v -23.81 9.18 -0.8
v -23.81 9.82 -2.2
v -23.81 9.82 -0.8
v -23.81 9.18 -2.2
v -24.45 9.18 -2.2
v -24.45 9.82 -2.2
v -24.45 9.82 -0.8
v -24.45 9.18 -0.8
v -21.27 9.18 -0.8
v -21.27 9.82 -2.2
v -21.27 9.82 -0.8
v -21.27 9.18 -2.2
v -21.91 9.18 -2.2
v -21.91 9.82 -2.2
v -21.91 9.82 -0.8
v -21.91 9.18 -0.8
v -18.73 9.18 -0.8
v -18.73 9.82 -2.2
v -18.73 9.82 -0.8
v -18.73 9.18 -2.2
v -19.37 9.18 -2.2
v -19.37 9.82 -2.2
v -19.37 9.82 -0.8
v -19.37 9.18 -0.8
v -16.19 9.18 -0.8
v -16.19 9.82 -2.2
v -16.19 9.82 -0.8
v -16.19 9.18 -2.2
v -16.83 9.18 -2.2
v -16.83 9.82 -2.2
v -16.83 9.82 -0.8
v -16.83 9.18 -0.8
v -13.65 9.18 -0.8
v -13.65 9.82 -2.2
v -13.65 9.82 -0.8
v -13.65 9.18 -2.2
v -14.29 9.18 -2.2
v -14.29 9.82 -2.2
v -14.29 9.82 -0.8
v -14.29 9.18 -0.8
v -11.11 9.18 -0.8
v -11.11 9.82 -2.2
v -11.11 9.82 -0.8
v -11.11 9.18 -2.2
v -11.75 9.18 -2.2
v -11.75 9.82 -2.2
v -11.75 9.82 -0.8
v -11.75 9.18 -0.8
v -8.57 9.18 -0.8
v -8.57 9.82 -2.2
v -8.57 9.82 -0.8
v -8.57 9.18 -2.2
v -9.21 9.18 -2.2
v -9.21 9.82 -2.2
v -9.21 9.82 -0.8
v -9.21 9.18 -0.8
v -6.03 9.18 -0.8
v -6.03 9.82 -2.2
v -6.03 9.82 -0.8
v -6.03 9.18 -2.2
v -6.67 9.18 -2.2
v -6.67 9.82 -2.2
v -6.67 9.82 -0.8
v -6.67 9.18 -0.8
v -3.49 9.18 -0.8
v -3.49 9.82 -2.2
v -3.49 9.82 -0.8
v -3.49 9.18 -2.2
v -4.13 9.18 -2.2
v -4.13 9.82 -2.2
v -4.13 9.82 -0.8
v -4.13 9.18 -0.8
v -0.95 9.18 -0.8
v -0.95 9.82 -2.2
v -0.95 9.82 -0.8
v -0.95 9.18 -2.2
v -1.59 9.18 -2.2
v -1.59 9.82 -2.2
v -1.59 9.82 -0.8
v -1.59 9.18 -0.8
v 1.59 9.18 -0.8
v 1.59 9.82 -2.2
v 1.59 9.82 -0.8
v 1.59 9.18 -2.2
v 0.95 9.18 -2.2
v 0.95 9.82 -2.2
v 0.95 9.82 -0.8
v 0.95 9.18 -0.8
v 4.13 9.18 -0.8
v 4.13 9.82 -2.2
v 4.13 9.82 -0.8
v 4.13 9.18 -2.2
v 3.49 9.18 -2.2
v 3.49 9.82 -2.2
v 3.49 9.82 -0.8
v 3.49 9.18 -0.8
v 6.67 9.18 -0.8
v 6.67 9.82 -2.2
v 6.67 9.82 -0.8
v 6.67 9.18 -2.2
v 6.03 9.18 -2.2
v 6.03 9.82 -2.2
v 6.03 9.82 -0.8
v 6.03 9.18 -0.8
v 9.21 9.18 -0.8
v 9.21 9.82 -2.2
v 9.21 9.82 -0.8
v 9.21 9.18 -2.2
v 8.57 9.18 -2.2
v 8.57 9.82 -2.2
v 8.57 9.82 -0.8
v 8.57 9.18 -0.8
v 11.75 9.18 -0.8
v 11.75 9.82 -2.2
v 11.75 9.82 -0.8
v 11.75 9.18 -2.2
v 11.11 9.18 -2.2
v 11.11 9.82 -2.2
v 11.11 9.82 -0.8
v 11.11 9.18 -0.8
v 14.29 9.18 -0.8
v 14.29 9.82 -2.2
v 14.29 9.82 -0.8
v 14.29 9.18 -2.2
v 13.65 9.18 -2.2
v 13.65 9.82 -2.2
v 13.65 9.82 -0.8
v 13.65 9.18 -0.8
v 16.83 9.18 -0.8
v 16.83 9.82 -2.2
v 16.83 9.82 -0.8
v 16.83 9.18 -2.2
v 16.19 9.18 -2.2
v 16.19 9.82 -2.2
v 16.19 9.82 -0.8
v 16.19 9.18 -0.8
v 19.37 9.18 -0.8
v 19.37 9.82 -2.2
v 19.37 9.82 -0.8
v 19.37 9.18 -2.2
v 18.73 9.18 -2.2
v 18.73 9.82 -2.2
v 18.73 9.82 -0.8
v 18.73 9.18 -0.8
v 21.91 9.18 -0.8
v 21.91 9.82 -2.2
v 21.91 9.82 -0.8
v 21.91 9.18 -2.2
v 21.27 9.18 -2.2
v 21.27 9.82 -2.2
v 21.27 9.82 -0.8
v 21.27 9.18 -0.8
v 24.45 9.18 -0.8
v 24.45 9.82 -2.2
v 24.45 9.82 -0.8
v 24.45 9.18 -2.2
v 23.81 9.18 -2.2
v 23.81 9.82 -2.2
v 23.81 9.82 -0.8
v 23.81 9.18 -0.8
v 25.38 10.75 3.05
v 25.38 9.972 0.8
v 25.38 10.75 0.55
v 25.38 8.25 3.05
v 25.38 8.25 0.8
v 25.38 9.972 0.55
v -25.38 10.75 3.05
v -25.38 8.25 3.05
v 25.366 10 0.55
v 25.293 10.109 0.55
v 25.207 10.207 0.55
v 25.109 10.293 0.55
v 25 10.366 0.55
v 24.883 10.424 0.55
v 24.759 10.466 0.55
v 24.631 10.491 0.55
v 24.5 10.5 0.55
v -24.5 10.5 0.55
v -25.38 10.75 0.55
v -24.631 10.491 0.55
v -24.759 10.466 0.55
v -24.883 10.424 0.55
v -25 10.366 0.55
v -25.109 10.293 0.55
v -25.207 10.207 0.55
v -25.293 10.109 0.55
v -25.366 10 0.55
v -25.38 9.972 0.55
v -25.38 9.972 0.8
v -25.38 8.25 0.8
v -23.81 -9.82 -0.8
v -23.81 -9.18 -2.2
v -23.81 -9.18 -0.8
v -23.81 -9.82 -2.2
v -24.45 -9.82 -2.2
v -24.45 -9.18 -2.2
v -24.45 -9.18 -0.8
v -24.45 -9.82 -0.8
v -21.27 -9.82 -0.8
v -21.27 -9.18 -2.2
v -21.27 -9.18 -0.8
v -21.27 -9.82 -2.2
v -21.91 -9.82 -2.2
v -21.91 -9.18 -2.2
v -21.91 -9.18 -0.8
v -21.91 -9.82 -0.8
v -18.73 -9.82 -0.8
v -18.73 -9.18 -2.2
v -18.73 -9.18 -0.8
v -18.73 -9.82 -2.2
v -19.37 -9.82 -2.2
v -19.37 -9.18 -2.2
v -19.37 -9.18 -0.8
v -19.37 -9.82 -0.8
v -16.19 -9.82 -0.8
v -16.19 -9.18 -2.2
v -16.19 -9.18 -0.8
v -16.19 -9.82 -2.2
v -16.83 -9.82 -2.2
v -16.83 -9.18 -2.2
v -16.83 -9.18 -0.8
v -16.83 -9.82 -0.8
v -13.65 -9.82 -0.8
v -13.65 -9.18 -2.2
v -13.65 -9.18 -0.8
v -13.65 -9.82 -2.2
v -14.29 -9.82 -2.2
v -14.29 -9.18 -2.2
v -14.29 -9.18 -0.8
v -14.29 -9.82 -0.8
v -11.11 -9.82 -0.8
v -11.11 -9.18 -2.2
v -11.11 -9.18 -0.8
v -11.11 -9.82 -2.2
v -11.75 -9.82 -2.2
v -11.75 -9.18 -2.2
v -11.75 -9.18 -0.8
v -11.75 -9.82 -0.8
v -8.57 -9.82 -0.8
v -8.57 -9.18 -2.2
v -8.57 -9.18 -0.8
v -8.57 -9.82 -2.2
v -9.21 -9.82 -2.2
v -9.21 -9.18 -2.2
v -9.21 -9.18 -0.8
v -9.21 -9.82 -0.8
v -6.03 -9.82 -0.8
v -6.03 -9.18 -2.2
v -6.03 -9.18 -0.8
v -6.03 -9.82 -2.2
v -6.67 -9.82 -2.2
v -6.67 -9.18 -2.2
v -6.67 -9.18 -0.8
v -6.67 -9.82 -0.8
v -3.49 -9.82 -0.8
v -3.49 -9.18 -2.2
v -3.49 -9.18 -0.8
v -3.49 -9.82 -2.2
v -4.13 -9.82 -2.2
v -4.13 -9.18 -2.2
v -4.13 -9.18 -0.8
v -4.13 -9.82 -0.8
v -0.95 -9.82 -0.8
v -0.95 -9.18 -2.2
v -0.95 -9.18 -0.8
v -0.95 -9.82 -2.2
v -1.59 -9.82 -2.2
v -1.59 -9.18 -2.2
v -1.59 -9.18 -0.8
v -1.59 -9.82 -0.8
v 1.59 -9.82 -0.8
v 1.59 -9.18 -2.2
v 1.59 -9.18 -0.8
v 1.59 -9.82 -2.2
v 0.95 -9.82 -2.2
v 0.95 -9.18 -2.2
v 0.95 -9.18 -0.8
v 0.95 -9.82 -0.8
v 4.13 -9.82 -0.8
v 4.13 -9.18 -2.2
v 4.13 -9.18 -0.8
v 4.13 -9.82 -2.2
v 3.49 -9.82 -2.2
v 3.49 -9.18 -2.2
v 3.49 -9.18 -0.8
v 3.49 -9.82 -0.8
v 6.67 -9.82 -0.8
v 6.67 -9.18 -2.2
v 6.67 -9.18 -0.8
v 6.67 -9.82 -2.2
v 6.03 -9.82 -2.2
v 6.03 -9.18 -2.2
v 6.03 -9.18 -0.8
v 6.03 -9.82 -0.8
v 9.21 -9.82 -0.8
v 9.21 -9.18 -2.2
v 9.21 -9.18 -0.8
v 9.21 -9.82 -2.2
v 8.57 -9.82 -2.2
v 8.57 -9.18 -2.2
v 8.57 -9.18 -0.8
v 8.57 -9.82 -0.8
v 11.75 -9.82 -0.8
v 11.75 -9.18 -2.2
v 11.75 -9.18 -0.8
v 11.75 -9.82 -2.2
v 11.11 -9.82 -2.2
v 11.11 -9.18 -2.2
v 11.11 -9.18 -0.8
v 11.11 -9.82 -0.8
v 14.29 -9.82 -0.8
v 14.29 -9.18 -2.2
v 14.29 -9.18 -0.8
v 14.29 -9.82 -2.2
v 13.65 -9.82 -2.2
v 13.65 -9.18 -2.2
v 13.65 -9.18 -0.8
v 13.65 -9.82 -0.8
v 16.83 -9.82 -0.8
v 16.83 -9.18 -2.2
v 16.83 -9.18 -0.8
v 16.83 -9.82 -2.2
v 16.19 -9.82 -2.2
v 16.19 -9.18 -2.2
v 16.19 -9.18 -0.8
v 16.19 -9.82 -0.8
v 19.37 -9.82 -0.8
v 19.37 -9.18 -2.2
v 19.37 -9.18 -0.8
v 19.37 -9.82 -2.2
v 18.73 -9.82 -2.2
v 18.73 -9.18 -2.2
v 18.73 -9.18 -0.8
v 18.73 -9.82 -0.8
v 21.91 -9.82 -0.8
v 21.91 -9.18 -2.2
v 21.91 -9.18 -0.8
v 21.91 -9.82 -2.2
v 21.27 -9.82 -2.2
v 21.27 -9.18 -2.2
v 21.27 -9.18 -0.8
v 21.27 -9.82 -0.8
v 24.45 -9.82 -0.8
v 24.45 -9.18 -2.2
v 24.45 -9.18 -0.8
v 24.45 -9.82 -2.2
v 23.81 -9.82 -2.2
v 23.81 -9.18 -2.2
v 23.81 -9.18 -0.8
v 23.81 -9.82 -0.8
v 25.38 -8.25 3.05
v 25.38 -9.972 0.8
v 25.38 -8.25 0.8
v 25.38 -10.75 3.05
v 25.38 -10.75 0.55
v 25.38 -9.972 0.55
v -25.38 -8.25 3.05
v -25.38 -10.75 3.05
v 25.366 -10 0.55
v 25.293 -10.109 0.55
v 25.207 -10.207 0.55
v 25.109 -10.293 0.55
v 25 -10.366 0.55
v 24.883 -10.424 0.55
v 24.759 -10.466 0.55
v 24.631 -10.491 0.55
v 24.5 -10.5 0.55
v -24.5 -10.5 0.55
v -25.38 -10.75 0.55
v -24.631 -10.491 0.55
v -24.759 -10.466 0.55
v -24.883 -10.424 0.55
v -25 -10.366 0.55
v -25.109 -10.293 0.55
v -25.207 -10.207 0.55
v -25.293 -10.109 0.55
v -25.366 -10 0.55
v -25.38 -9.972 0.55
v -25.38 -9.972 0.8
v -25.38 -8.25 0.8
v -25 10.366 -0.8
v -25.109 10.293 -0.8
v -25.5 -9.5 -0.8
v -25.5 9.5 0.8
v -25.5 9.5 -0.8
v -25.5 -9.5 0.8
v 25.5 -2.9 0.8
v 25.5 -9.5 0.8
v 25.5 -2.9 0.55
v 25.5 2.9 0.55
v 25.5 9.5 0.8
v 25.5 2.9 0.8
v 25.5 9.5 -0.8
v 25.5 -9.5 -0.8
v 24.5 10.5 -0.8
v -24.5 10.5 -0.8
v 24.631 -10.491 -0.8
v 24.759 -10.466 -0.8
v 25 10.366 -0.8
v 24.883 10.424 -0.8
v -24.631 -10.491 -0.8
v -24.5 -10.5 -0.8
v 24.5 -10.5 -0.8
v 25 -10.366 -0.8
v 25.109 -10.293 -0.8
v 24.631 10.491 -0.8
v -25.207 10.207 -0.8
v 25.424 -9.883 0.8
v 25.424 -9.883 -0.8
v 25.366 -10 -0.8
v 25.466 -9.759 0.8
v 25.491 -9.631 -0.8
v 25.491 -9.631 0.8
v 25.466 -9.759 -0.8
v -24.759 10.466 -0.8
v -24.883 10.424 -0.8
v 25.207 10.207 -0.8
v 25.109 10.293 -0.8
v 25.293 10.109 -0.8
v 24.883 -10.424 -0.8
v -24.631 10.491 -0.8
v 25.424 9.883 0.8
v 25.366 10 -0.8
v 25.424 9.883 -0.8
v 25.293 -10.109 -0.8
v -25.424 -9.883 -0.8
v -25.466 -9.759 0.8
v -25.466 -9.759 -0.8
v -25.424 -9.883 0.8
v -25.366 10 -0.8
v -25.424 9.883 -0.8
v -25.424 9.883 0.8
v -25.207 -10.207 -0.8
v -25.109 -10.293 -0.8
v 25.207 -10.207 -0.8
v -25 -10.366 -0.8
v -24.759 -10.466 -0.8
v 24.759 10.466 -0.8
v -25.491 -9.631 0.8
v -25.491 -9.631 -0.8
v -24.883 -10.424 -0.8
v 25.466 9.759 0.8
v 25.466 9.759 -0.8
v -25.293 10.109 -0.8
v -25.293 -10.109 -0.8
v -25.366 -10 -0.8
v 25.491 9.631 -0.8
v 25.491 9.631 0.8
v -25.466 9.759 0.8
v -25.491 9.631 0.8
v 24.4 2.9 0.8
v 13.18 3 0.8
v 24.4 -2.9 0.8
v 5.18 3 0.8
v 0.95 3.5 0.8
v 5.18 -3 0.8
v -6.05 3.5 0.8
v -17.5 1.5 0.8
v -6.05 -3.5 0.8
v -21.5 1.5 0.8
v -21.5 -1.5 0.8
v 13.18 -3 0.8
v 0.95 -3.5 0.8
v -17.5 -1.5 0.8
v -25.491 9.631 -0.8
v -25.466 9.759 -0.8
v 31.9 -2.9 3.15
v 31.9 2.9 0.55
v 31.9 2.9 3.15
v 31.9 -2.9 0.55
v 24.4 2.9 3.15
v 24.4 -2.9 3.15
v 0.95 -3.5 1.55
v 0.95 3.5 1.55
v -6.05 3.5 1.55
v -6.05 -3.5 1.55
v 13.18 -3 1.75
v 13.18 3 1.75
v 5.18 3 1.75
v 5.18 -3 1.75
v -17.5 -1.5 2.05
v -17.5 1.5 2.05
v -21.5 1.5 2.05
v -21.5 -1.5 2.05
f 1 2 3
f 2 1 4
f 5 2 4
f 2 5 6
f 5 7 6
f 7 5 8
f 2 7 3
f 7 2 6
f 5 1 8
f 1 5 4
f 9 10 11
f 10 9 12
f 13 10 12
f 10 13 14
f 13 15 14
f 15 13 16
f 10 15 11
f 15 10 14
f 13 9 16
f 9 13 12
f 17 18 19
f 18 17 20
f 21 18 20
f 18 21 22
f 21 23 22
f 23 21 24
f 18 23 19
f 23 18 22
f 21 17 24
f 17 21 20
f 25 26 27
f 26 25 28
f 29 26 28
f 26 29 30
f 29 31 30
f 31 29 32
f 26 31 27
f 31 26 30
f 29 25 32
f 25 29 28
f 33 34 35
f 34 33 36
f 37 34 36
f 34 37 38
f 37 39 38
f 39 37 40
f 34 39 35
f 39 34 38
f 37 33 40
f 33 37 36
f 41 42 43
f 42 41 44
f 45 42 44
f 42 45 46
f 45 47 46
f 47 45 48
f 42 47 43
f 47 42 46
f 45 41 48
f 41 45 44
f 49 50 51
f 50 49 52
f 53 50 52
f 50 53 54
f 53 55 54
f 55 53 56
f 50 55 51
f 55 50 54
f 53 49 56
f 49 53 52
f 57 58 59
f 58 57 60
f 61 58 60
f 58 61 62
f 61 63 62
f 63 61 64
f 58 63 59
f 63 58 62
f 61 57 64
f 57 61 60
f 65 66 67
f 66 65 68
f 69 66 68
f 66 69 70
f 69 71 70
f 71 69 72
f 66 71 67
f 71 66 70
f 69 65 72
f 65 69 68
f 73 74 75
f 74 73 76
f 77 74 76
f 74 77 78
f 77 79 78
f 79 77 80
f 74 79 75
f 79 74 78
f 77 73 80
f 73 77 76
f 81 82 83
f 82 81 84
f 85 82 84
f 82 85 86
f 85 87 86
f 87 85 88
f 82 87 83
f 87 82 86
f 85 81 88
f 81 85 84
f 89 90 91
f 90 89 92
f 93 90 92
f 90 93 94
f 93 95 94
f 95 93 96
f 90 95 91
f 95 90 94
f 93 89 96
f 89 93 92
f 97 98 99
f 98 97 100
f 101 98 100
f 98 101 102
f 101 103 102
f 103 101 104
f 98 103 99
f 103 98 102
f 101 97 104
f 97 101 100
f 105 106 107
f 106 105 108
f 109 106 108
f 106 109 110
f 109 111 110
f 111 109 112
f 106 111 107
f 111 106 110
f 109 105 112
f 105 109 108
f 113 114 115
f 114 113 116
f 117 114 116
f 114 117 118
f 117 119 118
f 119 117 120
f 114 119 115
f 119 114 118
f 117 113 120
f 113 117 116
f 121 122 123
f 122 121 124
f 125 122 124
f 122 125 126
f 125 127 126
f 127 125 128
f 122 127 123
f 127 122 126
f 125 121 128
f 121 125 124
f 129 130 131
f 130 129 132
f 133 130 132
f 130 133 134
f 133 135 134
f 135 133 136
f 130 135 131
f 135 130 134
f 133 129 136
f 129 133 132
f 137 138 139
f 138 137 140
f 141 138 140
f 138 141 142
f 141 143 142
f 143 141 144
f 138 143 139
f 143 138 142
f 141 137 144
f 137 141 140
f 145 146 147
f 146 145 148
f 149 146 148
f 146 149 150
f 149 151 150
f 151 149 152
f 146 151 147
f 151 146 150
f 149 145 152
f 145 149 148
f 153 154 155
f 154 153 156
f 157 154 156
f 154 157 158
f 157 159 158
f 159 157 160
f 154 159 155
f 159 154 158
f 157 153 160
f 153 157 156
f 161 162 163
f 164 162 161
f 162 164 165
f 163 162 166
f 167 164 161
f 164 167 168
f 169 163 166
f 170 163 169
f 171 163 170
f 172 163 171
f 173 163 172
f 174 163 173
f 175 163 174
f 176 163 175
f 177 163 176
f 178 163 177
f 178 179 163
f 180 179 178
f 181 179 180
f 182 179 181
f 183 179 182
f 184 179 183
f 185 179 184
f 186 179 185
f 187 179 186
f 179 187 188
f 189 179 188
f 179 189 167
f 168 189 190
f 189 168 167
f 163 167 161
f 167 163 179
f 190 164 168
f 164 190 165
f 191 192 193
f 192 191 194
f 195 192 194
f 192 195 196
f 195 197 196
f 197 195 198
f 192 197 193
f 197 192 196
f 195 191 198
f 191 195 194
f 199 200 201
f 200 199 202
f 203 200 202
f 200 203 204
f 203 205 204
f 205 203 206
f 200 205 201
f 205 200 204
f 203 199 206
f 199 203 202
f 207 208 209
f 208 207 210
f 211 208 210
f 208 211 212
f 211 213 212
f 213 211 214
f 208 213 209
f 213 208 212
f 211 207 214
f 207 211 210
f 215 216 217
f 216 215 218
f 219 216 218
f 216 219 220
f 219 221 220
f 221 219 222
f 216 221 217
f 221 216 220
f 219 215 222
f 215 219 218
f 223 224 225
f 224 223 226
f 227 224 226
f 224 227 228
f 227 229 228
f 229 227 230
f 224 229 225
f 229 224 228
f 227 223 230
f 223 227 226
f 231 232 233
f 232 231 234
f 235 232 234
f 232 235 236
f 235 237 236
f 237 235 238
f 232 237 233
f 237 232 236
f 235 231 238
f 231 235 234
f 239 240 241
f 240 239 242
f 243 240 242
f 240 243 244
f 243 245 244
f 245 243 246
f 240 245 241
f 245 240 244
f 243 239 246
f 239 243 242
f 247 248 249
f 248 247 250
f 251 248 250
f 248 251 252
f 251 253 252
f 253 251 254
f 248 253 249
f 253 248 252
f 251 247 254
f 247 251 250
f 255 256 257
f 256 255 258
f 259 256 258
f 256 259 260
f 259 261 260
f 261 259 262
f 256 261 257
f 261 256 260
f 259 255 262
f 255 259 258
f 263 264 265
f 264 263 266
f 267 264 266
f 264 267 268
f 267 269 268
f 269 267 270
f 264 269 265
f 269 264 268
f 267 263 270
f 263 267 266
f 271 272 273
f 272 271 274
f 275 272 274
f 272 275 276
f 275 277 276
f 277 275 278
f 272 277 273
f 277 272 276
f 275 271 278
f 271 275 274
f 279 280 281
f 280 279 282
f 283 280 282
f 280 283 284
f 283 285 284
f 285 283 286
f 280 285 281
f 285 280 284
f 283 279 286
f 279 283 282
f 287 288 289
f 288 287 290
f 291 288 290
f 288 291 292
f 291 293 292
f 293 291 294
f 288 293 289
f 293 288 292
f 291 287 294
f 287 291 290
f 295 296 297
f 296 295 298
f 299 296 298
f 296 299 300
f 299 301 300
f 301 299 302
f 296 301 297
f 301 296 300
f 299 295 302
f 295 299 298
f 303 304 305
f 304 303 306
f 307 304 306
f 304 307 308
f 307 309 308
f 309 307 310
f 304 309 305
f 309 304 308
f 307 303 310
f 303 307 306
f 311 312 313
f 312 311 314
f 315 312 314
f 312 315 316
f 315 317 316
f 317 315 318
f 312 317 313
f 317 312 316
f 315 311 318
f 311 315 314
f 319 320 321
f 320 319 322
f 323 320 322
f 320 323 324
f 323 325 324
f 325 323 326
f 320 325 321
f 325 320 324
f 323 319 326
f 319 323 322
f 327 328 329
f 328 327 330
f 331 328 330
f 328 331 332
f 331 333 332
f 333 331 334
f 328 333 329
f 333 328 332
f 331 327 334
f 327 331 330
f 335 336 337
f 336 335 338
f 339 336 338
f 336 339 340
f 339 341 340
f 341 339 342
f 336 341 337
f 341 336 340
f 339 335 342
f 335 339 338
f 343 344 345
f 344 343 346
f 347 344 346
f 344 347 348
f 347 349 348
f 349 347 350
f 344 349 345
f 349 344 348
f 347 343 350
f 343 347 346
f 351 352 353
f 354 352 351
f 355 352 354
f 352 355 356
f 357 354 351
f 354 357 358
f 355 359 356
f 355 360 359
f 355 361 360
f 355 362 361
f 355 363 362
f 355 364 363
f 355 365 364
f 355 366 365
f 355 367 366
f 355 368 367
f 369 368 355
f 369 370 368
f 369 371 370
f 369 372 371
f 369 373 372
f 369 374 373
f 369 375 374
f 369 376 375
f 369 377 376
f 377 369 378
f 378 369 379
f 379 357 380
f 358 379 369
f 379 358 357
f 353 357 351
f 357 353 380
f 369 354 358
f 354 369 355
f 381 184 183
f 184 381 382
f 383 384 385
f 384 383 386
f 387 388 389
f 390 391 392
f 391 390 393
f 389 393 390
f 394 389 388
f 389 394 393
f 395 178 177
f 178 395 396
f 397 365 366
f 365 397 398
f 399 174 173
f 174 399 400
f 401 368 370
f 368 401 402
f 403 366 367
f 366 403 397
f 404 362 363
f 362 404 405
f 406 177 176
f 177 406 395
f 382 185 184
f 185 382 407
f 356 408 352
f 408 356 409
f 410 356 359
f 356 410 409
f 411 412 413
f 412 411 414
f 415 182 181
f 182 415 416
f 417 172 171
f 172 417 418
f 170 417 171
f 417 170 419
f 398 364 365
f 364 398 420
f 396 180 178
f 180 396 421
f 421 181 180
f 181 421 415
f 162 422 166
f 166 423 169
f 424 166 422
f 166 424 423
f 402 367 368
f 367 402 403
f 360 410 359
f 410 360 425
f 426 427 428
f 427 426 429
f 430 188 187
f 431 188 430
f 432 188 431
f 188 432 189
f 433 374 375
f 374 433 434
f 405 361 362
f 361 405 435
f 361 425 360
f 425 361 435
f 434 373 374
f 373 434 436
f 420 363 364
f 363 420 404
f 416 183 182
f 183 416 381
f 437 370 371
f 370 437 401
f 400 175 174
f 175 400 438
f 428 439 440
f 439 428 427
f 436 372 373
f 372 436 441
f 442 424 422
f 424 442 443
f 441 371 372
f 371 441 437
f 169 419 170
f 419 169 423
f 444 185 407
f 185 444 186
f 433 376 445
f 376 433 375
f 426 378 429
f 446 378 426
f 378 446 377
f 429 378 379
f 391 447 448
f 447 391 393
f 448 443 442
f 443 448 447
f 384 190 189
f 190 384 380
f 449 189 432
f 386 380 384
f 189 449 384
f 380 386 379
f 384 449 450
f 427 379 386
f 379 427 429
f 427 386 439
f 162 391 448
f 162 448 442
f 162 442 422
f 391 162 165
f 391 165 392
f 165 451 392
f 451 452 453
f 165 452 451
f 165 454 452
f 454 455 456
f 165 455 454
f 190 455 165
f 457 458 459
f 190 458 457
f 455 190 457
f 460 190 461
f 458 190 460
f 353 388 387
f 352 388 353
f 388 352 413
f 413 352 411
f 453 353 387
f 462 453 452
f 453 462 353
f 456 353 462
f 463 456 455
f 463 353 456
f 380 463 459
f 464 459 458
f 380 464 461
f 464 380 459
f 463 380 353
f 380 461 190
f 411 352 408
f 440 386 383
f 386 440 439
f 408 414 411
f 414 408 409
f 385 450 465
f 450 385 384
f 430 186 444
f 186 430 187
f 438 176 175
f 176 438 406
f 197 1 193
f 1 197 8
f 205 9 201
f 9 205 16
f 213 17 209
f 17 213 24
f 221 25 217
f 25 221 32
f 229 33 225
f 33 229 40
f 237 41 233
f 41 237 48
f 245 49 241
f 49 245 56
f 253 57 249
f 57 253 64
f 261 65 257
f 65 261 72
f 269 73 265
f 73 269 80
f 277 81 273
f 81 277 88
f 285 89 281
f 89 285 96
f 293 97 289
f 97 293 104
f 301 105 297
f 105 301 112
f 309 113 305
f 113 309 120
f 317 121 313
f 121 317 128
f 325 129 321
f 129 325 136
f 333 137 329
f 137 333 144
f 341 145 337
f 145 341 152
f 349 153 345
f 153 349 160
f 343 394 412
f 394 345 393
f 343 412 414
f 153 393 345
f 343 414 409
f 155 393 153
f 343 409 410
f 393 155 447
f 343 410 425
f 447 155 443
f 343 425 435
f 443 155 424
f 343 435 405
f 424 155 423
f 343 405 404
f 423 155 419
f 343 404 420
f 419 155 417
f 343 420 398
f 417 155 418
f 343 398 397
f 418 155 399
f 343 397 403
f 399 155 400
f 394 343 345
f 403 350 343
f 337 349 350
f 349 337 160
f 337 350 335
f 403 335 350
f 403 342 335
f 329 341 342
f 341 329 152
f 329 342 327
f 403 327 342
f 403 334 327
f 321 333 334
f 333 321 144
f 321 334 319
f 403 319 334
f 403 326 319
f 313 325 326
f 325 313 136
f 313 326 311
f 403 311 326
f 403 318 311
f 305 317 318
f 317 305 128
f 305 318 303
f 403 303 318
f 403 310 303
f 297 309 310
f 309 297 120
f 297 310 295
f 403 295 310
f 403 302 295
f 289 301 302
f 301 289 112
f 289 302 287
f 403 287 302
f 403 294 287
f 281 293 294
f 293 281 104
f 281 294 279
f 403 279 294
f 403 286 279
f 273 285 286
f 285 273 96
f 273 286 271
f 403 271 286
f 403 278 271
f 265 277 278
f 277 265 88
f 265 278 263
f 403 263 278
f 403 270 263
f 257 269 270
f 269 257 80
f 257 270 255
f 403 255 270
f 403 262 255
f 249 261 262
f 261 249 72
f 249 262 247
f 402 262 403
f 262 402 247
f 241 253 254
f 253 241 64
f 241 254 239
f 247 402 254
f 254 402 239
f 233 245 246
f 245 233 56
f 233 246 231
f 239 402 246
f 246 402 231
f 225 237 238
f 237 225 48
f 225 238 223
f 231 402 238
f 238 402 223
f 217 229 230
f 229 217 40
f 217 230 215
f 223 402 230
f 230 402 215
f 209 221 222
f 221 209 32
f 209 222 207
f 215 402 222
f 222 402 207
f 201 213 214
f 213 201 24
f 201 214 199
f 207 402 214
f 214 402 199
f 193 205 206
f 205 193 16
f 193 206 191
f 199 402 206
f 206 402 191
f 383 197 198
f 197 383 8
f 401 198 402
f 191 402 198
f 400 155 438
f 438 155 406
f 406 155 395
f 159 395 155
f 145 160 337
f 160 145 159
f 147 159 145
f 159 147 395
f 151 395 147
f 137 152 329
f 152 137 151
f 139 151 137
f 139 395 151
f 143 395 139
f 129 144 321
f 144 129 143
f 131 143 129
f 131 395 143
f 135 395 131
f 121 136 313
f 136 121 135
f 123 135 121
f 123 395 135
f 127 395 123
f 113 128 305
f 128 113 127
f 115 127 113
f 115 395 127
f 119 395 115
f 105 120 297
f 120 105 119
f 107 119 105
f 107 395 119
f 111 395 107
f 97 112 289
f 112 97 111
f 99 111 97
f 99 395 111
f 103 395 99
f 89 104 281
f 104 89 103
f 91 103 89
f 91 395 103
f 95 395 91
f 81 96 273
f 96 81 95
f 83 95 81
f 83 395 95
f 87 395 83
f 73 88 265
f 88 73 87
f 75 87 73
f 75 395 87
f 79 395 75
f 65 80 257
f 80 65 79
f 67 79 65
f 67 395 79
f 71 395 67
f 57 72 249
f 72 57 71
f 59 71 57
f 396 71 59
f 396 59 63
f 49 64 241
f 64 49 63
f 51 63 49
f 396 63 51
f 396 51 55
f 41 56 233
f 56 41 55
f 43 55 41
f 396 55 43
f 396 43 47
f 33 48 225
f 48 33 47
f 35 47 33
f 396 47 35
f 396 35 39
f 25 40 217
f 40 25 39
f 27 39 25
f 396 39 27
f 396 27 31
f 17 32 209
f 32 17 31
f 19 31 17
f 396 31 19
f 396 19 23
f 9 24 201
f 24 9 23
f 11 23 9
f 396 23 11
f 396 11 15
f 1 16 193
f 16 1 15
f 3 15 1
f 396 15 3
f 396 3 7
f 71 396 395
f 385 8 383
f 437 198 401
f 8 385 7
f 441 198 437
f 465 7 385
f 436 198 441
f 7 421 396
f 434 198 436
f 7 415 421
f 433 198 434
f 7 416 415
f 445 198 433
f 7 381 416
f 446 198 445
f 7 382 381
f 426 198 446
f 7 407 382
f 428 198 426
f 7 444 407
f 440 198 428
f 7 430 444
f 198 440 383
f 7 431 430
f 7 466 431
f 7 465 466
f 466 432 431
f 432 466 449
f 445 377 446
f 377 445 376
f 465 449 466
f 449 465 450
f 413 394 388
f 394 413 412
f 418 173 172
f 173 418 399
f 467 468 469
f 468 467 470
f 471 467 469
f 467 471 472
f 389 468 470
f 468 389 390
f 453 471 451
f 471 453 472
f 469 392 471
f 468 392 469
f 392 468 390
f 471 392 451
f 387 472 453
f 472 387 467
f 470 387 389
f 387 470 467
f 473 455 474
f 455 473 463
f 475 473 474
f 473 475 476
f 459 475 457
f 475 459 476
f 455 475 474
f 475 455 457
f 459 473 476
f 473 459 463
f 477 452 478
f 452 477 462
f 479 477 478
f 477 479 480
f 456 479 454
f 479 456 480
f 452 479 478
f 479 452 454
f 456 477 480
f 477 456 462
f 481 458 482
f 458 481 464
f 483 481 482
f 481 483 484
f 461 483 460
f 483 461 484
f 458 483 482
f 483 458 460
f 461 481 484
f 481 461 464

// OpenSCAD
// Single-board computer (Raspberry Pi Pico-like) proxy model
// Target PCB: 51.0mm x 21.0mm x 1.6mm
// One connected solid; all placements are dimension-derived (no arbitrary floating).

$fn = 48;

// Parameters
length_mm = 51.0;      // X
width_mm  = 21.0;      // Y
thickness_mm = 1.6;    // Z
corner_radius_mm = 1.0;

// Small overlap to guarantee watertight unions
overlap = 0.25;

// ---------- Helpers ----------
module rounded_plate(l, w, h, r) {
    // Rounded rectangle prism using hull of corner cylinders
    r2 = min(r, min(l, w)/2);
    hull() {
        for (sx = [-1, 1], sy = [-1, 1])
            translate([sx*(l/2 - r2), sy*(w/2 - r2), 0])
                cylinder(r=r2, h=h, center=true);
    }
}

module pin_header_row(n=20, pitch=2.54, pin_w=0.64, pin_h=3.0, body_h=2.5, body_w=2.5) {
    // A single row header: plastic body + pins
    row_len = (n-1)*pitch + body_w;
    union() {
        // Plastic body
        translate([0, 0, 0])
            cube([row_len, body_w, body_h], center=true);

        // Pins (extend downward)
        for (i = [0:n-1]) {
            x = -row_len/2 + body_w/2 + i*pitch;
            translate([x, 0, -(body_h/2 + pin_h/2 - overlap)])
                cube([pin_w, pin_w, pin_h], center=true);
        }
    }
}

module usb_micro_b_shell(w=7.5, d=5.8, h=2.6) {
    // Simple micro-USB-like metal shell block
    cube([w, d, h], center=true);
}

module qfn_chip(body=7.0, h=1.0) {
    cube([body, body, h], center=true);
}

module small_ic(l=8.0, w=6.0, h=1.2) {
    cube([l, w, h], center=true);
}

// ---------- Main SBC ----------
module SBC_51x21() {
    // Derived constants
    pcb_l = length_mm;
    pcb_w = width_mm;
    pcb_t = thickness_mm;

    // Component sizes (kept plausible, not exact)
    usb_w = 7.5;
    usb_d = 5.8;
    usb_h = 2.6;

    header_n = 20;
    header_pitch = 2.54;
    header_body_h = 2.5;
    header_body_w = 2.5;
    header_pin_h  = 3.0;

    // Header row length
    header_len = (header_n-1)*header_pitch + header_body_w;

    // Placement formulas (all connected with overlap)
    pcb_top_z = pcb_t/2;
    pcb_bot_z = -pcb_t/2;

    // USB at +X edge, centered in Y, sitting on top of PCB
    usb_center_x = pcb_l/2 + usb_d/2 - overlap; // overlaps into PCB edge
    usb_center_y = 0;
    usb_center_z = pcb_top_z + usb_h/2 - overlap;

    // Headers along long edges (Y = +/-), centered in X
    header_center_x = 0;
    header_offset_y = pcb_w/2 - header_body_w/2 + overlap; // overlaps into PCB
    header_center_z = pcb_top_z + header_body_h/2 - overlap;

    // MCU and flash on top
    mcu_body = 7.0;
    mcu_h = 1.0;
    mcu_center_x = -pcb_l*0.05;
    mcu_center_y = 0;
    mcu_center_z = pcb_top_z + mcu_h/2 - overlap;

    flash_l = 8.0;
    flash_w = 6.0;
    flash_h = 1.2;
    flash_center_x = pcb_l*0.18;
    flash_center_y = 0;
    flash_center_z = pcb_top_z + flash_h/2 - overlap;

    // A small button near -X end
    btn_l = 4.0;
    btn_w = 3.0;
    btn_h = 1.5;
    btn_center_x = -pcb_l/2 + 6.0;
    btn_center_y = 0;
    btn_center_z = pcb_top_z + btn_h/2 - overlap;

    // Keep everything as ONE connected solid
    union() {
        // PCB
        color([0.0, 0.4, 0.2])
            rounded_plate(pcb_l, pcb_w, pcb_t, corner_radius_mm);

        // USB connector
        color([0.75, 0.75, 0.78])
            translate([usb_center_x, usb_center_y, usb_center_z])
                usb_micro_b_shell(usb_w, usb_d, usb_h);

        // Pin headers (two rows)
        color([0.1, 0.1, 0.1])
            translate([header_center_x,  header_offset_y, header_center_z])
                pin_header_row(n=header_n, pitch=header_pitch, body_h=header_body_h, body_w=header_body_w, pin_h=header_pin_h);

        color([0.1, 0.1, 0.1])
            translate([header_center_x, -header_offset_y, header_center_z])
                pin_header_row(n=header_n, pitch=header_pitch, body_h=header_body_h, body_w=header_body_w, pin_h=header_pin_h);

        // MCU
        color([0.15, 0.15, 0.15])
            translate([mcu_center_x, mcu_center_y, mcu_center_z])
                qfn_chip(body=mcu_body, h=mcu_h);

        // Flash / secondary IC
        color([0.18, 0.18, 0.18])
            translate([flash_center_x, flash_center_y, flash_center_z])
                small_ic(l=flash_l, w=flash_w, h=flash_h);

        // Button
        color([0.2, 0.2, 0.2])
            translate([btn_center_x, btn_center_y, btn_center_z])
                cube([btn_l, btn_w, btn_h], center=true);
    }
}

// Assembly
module assembly() {
    SBC_51x21();
}

assembly();
